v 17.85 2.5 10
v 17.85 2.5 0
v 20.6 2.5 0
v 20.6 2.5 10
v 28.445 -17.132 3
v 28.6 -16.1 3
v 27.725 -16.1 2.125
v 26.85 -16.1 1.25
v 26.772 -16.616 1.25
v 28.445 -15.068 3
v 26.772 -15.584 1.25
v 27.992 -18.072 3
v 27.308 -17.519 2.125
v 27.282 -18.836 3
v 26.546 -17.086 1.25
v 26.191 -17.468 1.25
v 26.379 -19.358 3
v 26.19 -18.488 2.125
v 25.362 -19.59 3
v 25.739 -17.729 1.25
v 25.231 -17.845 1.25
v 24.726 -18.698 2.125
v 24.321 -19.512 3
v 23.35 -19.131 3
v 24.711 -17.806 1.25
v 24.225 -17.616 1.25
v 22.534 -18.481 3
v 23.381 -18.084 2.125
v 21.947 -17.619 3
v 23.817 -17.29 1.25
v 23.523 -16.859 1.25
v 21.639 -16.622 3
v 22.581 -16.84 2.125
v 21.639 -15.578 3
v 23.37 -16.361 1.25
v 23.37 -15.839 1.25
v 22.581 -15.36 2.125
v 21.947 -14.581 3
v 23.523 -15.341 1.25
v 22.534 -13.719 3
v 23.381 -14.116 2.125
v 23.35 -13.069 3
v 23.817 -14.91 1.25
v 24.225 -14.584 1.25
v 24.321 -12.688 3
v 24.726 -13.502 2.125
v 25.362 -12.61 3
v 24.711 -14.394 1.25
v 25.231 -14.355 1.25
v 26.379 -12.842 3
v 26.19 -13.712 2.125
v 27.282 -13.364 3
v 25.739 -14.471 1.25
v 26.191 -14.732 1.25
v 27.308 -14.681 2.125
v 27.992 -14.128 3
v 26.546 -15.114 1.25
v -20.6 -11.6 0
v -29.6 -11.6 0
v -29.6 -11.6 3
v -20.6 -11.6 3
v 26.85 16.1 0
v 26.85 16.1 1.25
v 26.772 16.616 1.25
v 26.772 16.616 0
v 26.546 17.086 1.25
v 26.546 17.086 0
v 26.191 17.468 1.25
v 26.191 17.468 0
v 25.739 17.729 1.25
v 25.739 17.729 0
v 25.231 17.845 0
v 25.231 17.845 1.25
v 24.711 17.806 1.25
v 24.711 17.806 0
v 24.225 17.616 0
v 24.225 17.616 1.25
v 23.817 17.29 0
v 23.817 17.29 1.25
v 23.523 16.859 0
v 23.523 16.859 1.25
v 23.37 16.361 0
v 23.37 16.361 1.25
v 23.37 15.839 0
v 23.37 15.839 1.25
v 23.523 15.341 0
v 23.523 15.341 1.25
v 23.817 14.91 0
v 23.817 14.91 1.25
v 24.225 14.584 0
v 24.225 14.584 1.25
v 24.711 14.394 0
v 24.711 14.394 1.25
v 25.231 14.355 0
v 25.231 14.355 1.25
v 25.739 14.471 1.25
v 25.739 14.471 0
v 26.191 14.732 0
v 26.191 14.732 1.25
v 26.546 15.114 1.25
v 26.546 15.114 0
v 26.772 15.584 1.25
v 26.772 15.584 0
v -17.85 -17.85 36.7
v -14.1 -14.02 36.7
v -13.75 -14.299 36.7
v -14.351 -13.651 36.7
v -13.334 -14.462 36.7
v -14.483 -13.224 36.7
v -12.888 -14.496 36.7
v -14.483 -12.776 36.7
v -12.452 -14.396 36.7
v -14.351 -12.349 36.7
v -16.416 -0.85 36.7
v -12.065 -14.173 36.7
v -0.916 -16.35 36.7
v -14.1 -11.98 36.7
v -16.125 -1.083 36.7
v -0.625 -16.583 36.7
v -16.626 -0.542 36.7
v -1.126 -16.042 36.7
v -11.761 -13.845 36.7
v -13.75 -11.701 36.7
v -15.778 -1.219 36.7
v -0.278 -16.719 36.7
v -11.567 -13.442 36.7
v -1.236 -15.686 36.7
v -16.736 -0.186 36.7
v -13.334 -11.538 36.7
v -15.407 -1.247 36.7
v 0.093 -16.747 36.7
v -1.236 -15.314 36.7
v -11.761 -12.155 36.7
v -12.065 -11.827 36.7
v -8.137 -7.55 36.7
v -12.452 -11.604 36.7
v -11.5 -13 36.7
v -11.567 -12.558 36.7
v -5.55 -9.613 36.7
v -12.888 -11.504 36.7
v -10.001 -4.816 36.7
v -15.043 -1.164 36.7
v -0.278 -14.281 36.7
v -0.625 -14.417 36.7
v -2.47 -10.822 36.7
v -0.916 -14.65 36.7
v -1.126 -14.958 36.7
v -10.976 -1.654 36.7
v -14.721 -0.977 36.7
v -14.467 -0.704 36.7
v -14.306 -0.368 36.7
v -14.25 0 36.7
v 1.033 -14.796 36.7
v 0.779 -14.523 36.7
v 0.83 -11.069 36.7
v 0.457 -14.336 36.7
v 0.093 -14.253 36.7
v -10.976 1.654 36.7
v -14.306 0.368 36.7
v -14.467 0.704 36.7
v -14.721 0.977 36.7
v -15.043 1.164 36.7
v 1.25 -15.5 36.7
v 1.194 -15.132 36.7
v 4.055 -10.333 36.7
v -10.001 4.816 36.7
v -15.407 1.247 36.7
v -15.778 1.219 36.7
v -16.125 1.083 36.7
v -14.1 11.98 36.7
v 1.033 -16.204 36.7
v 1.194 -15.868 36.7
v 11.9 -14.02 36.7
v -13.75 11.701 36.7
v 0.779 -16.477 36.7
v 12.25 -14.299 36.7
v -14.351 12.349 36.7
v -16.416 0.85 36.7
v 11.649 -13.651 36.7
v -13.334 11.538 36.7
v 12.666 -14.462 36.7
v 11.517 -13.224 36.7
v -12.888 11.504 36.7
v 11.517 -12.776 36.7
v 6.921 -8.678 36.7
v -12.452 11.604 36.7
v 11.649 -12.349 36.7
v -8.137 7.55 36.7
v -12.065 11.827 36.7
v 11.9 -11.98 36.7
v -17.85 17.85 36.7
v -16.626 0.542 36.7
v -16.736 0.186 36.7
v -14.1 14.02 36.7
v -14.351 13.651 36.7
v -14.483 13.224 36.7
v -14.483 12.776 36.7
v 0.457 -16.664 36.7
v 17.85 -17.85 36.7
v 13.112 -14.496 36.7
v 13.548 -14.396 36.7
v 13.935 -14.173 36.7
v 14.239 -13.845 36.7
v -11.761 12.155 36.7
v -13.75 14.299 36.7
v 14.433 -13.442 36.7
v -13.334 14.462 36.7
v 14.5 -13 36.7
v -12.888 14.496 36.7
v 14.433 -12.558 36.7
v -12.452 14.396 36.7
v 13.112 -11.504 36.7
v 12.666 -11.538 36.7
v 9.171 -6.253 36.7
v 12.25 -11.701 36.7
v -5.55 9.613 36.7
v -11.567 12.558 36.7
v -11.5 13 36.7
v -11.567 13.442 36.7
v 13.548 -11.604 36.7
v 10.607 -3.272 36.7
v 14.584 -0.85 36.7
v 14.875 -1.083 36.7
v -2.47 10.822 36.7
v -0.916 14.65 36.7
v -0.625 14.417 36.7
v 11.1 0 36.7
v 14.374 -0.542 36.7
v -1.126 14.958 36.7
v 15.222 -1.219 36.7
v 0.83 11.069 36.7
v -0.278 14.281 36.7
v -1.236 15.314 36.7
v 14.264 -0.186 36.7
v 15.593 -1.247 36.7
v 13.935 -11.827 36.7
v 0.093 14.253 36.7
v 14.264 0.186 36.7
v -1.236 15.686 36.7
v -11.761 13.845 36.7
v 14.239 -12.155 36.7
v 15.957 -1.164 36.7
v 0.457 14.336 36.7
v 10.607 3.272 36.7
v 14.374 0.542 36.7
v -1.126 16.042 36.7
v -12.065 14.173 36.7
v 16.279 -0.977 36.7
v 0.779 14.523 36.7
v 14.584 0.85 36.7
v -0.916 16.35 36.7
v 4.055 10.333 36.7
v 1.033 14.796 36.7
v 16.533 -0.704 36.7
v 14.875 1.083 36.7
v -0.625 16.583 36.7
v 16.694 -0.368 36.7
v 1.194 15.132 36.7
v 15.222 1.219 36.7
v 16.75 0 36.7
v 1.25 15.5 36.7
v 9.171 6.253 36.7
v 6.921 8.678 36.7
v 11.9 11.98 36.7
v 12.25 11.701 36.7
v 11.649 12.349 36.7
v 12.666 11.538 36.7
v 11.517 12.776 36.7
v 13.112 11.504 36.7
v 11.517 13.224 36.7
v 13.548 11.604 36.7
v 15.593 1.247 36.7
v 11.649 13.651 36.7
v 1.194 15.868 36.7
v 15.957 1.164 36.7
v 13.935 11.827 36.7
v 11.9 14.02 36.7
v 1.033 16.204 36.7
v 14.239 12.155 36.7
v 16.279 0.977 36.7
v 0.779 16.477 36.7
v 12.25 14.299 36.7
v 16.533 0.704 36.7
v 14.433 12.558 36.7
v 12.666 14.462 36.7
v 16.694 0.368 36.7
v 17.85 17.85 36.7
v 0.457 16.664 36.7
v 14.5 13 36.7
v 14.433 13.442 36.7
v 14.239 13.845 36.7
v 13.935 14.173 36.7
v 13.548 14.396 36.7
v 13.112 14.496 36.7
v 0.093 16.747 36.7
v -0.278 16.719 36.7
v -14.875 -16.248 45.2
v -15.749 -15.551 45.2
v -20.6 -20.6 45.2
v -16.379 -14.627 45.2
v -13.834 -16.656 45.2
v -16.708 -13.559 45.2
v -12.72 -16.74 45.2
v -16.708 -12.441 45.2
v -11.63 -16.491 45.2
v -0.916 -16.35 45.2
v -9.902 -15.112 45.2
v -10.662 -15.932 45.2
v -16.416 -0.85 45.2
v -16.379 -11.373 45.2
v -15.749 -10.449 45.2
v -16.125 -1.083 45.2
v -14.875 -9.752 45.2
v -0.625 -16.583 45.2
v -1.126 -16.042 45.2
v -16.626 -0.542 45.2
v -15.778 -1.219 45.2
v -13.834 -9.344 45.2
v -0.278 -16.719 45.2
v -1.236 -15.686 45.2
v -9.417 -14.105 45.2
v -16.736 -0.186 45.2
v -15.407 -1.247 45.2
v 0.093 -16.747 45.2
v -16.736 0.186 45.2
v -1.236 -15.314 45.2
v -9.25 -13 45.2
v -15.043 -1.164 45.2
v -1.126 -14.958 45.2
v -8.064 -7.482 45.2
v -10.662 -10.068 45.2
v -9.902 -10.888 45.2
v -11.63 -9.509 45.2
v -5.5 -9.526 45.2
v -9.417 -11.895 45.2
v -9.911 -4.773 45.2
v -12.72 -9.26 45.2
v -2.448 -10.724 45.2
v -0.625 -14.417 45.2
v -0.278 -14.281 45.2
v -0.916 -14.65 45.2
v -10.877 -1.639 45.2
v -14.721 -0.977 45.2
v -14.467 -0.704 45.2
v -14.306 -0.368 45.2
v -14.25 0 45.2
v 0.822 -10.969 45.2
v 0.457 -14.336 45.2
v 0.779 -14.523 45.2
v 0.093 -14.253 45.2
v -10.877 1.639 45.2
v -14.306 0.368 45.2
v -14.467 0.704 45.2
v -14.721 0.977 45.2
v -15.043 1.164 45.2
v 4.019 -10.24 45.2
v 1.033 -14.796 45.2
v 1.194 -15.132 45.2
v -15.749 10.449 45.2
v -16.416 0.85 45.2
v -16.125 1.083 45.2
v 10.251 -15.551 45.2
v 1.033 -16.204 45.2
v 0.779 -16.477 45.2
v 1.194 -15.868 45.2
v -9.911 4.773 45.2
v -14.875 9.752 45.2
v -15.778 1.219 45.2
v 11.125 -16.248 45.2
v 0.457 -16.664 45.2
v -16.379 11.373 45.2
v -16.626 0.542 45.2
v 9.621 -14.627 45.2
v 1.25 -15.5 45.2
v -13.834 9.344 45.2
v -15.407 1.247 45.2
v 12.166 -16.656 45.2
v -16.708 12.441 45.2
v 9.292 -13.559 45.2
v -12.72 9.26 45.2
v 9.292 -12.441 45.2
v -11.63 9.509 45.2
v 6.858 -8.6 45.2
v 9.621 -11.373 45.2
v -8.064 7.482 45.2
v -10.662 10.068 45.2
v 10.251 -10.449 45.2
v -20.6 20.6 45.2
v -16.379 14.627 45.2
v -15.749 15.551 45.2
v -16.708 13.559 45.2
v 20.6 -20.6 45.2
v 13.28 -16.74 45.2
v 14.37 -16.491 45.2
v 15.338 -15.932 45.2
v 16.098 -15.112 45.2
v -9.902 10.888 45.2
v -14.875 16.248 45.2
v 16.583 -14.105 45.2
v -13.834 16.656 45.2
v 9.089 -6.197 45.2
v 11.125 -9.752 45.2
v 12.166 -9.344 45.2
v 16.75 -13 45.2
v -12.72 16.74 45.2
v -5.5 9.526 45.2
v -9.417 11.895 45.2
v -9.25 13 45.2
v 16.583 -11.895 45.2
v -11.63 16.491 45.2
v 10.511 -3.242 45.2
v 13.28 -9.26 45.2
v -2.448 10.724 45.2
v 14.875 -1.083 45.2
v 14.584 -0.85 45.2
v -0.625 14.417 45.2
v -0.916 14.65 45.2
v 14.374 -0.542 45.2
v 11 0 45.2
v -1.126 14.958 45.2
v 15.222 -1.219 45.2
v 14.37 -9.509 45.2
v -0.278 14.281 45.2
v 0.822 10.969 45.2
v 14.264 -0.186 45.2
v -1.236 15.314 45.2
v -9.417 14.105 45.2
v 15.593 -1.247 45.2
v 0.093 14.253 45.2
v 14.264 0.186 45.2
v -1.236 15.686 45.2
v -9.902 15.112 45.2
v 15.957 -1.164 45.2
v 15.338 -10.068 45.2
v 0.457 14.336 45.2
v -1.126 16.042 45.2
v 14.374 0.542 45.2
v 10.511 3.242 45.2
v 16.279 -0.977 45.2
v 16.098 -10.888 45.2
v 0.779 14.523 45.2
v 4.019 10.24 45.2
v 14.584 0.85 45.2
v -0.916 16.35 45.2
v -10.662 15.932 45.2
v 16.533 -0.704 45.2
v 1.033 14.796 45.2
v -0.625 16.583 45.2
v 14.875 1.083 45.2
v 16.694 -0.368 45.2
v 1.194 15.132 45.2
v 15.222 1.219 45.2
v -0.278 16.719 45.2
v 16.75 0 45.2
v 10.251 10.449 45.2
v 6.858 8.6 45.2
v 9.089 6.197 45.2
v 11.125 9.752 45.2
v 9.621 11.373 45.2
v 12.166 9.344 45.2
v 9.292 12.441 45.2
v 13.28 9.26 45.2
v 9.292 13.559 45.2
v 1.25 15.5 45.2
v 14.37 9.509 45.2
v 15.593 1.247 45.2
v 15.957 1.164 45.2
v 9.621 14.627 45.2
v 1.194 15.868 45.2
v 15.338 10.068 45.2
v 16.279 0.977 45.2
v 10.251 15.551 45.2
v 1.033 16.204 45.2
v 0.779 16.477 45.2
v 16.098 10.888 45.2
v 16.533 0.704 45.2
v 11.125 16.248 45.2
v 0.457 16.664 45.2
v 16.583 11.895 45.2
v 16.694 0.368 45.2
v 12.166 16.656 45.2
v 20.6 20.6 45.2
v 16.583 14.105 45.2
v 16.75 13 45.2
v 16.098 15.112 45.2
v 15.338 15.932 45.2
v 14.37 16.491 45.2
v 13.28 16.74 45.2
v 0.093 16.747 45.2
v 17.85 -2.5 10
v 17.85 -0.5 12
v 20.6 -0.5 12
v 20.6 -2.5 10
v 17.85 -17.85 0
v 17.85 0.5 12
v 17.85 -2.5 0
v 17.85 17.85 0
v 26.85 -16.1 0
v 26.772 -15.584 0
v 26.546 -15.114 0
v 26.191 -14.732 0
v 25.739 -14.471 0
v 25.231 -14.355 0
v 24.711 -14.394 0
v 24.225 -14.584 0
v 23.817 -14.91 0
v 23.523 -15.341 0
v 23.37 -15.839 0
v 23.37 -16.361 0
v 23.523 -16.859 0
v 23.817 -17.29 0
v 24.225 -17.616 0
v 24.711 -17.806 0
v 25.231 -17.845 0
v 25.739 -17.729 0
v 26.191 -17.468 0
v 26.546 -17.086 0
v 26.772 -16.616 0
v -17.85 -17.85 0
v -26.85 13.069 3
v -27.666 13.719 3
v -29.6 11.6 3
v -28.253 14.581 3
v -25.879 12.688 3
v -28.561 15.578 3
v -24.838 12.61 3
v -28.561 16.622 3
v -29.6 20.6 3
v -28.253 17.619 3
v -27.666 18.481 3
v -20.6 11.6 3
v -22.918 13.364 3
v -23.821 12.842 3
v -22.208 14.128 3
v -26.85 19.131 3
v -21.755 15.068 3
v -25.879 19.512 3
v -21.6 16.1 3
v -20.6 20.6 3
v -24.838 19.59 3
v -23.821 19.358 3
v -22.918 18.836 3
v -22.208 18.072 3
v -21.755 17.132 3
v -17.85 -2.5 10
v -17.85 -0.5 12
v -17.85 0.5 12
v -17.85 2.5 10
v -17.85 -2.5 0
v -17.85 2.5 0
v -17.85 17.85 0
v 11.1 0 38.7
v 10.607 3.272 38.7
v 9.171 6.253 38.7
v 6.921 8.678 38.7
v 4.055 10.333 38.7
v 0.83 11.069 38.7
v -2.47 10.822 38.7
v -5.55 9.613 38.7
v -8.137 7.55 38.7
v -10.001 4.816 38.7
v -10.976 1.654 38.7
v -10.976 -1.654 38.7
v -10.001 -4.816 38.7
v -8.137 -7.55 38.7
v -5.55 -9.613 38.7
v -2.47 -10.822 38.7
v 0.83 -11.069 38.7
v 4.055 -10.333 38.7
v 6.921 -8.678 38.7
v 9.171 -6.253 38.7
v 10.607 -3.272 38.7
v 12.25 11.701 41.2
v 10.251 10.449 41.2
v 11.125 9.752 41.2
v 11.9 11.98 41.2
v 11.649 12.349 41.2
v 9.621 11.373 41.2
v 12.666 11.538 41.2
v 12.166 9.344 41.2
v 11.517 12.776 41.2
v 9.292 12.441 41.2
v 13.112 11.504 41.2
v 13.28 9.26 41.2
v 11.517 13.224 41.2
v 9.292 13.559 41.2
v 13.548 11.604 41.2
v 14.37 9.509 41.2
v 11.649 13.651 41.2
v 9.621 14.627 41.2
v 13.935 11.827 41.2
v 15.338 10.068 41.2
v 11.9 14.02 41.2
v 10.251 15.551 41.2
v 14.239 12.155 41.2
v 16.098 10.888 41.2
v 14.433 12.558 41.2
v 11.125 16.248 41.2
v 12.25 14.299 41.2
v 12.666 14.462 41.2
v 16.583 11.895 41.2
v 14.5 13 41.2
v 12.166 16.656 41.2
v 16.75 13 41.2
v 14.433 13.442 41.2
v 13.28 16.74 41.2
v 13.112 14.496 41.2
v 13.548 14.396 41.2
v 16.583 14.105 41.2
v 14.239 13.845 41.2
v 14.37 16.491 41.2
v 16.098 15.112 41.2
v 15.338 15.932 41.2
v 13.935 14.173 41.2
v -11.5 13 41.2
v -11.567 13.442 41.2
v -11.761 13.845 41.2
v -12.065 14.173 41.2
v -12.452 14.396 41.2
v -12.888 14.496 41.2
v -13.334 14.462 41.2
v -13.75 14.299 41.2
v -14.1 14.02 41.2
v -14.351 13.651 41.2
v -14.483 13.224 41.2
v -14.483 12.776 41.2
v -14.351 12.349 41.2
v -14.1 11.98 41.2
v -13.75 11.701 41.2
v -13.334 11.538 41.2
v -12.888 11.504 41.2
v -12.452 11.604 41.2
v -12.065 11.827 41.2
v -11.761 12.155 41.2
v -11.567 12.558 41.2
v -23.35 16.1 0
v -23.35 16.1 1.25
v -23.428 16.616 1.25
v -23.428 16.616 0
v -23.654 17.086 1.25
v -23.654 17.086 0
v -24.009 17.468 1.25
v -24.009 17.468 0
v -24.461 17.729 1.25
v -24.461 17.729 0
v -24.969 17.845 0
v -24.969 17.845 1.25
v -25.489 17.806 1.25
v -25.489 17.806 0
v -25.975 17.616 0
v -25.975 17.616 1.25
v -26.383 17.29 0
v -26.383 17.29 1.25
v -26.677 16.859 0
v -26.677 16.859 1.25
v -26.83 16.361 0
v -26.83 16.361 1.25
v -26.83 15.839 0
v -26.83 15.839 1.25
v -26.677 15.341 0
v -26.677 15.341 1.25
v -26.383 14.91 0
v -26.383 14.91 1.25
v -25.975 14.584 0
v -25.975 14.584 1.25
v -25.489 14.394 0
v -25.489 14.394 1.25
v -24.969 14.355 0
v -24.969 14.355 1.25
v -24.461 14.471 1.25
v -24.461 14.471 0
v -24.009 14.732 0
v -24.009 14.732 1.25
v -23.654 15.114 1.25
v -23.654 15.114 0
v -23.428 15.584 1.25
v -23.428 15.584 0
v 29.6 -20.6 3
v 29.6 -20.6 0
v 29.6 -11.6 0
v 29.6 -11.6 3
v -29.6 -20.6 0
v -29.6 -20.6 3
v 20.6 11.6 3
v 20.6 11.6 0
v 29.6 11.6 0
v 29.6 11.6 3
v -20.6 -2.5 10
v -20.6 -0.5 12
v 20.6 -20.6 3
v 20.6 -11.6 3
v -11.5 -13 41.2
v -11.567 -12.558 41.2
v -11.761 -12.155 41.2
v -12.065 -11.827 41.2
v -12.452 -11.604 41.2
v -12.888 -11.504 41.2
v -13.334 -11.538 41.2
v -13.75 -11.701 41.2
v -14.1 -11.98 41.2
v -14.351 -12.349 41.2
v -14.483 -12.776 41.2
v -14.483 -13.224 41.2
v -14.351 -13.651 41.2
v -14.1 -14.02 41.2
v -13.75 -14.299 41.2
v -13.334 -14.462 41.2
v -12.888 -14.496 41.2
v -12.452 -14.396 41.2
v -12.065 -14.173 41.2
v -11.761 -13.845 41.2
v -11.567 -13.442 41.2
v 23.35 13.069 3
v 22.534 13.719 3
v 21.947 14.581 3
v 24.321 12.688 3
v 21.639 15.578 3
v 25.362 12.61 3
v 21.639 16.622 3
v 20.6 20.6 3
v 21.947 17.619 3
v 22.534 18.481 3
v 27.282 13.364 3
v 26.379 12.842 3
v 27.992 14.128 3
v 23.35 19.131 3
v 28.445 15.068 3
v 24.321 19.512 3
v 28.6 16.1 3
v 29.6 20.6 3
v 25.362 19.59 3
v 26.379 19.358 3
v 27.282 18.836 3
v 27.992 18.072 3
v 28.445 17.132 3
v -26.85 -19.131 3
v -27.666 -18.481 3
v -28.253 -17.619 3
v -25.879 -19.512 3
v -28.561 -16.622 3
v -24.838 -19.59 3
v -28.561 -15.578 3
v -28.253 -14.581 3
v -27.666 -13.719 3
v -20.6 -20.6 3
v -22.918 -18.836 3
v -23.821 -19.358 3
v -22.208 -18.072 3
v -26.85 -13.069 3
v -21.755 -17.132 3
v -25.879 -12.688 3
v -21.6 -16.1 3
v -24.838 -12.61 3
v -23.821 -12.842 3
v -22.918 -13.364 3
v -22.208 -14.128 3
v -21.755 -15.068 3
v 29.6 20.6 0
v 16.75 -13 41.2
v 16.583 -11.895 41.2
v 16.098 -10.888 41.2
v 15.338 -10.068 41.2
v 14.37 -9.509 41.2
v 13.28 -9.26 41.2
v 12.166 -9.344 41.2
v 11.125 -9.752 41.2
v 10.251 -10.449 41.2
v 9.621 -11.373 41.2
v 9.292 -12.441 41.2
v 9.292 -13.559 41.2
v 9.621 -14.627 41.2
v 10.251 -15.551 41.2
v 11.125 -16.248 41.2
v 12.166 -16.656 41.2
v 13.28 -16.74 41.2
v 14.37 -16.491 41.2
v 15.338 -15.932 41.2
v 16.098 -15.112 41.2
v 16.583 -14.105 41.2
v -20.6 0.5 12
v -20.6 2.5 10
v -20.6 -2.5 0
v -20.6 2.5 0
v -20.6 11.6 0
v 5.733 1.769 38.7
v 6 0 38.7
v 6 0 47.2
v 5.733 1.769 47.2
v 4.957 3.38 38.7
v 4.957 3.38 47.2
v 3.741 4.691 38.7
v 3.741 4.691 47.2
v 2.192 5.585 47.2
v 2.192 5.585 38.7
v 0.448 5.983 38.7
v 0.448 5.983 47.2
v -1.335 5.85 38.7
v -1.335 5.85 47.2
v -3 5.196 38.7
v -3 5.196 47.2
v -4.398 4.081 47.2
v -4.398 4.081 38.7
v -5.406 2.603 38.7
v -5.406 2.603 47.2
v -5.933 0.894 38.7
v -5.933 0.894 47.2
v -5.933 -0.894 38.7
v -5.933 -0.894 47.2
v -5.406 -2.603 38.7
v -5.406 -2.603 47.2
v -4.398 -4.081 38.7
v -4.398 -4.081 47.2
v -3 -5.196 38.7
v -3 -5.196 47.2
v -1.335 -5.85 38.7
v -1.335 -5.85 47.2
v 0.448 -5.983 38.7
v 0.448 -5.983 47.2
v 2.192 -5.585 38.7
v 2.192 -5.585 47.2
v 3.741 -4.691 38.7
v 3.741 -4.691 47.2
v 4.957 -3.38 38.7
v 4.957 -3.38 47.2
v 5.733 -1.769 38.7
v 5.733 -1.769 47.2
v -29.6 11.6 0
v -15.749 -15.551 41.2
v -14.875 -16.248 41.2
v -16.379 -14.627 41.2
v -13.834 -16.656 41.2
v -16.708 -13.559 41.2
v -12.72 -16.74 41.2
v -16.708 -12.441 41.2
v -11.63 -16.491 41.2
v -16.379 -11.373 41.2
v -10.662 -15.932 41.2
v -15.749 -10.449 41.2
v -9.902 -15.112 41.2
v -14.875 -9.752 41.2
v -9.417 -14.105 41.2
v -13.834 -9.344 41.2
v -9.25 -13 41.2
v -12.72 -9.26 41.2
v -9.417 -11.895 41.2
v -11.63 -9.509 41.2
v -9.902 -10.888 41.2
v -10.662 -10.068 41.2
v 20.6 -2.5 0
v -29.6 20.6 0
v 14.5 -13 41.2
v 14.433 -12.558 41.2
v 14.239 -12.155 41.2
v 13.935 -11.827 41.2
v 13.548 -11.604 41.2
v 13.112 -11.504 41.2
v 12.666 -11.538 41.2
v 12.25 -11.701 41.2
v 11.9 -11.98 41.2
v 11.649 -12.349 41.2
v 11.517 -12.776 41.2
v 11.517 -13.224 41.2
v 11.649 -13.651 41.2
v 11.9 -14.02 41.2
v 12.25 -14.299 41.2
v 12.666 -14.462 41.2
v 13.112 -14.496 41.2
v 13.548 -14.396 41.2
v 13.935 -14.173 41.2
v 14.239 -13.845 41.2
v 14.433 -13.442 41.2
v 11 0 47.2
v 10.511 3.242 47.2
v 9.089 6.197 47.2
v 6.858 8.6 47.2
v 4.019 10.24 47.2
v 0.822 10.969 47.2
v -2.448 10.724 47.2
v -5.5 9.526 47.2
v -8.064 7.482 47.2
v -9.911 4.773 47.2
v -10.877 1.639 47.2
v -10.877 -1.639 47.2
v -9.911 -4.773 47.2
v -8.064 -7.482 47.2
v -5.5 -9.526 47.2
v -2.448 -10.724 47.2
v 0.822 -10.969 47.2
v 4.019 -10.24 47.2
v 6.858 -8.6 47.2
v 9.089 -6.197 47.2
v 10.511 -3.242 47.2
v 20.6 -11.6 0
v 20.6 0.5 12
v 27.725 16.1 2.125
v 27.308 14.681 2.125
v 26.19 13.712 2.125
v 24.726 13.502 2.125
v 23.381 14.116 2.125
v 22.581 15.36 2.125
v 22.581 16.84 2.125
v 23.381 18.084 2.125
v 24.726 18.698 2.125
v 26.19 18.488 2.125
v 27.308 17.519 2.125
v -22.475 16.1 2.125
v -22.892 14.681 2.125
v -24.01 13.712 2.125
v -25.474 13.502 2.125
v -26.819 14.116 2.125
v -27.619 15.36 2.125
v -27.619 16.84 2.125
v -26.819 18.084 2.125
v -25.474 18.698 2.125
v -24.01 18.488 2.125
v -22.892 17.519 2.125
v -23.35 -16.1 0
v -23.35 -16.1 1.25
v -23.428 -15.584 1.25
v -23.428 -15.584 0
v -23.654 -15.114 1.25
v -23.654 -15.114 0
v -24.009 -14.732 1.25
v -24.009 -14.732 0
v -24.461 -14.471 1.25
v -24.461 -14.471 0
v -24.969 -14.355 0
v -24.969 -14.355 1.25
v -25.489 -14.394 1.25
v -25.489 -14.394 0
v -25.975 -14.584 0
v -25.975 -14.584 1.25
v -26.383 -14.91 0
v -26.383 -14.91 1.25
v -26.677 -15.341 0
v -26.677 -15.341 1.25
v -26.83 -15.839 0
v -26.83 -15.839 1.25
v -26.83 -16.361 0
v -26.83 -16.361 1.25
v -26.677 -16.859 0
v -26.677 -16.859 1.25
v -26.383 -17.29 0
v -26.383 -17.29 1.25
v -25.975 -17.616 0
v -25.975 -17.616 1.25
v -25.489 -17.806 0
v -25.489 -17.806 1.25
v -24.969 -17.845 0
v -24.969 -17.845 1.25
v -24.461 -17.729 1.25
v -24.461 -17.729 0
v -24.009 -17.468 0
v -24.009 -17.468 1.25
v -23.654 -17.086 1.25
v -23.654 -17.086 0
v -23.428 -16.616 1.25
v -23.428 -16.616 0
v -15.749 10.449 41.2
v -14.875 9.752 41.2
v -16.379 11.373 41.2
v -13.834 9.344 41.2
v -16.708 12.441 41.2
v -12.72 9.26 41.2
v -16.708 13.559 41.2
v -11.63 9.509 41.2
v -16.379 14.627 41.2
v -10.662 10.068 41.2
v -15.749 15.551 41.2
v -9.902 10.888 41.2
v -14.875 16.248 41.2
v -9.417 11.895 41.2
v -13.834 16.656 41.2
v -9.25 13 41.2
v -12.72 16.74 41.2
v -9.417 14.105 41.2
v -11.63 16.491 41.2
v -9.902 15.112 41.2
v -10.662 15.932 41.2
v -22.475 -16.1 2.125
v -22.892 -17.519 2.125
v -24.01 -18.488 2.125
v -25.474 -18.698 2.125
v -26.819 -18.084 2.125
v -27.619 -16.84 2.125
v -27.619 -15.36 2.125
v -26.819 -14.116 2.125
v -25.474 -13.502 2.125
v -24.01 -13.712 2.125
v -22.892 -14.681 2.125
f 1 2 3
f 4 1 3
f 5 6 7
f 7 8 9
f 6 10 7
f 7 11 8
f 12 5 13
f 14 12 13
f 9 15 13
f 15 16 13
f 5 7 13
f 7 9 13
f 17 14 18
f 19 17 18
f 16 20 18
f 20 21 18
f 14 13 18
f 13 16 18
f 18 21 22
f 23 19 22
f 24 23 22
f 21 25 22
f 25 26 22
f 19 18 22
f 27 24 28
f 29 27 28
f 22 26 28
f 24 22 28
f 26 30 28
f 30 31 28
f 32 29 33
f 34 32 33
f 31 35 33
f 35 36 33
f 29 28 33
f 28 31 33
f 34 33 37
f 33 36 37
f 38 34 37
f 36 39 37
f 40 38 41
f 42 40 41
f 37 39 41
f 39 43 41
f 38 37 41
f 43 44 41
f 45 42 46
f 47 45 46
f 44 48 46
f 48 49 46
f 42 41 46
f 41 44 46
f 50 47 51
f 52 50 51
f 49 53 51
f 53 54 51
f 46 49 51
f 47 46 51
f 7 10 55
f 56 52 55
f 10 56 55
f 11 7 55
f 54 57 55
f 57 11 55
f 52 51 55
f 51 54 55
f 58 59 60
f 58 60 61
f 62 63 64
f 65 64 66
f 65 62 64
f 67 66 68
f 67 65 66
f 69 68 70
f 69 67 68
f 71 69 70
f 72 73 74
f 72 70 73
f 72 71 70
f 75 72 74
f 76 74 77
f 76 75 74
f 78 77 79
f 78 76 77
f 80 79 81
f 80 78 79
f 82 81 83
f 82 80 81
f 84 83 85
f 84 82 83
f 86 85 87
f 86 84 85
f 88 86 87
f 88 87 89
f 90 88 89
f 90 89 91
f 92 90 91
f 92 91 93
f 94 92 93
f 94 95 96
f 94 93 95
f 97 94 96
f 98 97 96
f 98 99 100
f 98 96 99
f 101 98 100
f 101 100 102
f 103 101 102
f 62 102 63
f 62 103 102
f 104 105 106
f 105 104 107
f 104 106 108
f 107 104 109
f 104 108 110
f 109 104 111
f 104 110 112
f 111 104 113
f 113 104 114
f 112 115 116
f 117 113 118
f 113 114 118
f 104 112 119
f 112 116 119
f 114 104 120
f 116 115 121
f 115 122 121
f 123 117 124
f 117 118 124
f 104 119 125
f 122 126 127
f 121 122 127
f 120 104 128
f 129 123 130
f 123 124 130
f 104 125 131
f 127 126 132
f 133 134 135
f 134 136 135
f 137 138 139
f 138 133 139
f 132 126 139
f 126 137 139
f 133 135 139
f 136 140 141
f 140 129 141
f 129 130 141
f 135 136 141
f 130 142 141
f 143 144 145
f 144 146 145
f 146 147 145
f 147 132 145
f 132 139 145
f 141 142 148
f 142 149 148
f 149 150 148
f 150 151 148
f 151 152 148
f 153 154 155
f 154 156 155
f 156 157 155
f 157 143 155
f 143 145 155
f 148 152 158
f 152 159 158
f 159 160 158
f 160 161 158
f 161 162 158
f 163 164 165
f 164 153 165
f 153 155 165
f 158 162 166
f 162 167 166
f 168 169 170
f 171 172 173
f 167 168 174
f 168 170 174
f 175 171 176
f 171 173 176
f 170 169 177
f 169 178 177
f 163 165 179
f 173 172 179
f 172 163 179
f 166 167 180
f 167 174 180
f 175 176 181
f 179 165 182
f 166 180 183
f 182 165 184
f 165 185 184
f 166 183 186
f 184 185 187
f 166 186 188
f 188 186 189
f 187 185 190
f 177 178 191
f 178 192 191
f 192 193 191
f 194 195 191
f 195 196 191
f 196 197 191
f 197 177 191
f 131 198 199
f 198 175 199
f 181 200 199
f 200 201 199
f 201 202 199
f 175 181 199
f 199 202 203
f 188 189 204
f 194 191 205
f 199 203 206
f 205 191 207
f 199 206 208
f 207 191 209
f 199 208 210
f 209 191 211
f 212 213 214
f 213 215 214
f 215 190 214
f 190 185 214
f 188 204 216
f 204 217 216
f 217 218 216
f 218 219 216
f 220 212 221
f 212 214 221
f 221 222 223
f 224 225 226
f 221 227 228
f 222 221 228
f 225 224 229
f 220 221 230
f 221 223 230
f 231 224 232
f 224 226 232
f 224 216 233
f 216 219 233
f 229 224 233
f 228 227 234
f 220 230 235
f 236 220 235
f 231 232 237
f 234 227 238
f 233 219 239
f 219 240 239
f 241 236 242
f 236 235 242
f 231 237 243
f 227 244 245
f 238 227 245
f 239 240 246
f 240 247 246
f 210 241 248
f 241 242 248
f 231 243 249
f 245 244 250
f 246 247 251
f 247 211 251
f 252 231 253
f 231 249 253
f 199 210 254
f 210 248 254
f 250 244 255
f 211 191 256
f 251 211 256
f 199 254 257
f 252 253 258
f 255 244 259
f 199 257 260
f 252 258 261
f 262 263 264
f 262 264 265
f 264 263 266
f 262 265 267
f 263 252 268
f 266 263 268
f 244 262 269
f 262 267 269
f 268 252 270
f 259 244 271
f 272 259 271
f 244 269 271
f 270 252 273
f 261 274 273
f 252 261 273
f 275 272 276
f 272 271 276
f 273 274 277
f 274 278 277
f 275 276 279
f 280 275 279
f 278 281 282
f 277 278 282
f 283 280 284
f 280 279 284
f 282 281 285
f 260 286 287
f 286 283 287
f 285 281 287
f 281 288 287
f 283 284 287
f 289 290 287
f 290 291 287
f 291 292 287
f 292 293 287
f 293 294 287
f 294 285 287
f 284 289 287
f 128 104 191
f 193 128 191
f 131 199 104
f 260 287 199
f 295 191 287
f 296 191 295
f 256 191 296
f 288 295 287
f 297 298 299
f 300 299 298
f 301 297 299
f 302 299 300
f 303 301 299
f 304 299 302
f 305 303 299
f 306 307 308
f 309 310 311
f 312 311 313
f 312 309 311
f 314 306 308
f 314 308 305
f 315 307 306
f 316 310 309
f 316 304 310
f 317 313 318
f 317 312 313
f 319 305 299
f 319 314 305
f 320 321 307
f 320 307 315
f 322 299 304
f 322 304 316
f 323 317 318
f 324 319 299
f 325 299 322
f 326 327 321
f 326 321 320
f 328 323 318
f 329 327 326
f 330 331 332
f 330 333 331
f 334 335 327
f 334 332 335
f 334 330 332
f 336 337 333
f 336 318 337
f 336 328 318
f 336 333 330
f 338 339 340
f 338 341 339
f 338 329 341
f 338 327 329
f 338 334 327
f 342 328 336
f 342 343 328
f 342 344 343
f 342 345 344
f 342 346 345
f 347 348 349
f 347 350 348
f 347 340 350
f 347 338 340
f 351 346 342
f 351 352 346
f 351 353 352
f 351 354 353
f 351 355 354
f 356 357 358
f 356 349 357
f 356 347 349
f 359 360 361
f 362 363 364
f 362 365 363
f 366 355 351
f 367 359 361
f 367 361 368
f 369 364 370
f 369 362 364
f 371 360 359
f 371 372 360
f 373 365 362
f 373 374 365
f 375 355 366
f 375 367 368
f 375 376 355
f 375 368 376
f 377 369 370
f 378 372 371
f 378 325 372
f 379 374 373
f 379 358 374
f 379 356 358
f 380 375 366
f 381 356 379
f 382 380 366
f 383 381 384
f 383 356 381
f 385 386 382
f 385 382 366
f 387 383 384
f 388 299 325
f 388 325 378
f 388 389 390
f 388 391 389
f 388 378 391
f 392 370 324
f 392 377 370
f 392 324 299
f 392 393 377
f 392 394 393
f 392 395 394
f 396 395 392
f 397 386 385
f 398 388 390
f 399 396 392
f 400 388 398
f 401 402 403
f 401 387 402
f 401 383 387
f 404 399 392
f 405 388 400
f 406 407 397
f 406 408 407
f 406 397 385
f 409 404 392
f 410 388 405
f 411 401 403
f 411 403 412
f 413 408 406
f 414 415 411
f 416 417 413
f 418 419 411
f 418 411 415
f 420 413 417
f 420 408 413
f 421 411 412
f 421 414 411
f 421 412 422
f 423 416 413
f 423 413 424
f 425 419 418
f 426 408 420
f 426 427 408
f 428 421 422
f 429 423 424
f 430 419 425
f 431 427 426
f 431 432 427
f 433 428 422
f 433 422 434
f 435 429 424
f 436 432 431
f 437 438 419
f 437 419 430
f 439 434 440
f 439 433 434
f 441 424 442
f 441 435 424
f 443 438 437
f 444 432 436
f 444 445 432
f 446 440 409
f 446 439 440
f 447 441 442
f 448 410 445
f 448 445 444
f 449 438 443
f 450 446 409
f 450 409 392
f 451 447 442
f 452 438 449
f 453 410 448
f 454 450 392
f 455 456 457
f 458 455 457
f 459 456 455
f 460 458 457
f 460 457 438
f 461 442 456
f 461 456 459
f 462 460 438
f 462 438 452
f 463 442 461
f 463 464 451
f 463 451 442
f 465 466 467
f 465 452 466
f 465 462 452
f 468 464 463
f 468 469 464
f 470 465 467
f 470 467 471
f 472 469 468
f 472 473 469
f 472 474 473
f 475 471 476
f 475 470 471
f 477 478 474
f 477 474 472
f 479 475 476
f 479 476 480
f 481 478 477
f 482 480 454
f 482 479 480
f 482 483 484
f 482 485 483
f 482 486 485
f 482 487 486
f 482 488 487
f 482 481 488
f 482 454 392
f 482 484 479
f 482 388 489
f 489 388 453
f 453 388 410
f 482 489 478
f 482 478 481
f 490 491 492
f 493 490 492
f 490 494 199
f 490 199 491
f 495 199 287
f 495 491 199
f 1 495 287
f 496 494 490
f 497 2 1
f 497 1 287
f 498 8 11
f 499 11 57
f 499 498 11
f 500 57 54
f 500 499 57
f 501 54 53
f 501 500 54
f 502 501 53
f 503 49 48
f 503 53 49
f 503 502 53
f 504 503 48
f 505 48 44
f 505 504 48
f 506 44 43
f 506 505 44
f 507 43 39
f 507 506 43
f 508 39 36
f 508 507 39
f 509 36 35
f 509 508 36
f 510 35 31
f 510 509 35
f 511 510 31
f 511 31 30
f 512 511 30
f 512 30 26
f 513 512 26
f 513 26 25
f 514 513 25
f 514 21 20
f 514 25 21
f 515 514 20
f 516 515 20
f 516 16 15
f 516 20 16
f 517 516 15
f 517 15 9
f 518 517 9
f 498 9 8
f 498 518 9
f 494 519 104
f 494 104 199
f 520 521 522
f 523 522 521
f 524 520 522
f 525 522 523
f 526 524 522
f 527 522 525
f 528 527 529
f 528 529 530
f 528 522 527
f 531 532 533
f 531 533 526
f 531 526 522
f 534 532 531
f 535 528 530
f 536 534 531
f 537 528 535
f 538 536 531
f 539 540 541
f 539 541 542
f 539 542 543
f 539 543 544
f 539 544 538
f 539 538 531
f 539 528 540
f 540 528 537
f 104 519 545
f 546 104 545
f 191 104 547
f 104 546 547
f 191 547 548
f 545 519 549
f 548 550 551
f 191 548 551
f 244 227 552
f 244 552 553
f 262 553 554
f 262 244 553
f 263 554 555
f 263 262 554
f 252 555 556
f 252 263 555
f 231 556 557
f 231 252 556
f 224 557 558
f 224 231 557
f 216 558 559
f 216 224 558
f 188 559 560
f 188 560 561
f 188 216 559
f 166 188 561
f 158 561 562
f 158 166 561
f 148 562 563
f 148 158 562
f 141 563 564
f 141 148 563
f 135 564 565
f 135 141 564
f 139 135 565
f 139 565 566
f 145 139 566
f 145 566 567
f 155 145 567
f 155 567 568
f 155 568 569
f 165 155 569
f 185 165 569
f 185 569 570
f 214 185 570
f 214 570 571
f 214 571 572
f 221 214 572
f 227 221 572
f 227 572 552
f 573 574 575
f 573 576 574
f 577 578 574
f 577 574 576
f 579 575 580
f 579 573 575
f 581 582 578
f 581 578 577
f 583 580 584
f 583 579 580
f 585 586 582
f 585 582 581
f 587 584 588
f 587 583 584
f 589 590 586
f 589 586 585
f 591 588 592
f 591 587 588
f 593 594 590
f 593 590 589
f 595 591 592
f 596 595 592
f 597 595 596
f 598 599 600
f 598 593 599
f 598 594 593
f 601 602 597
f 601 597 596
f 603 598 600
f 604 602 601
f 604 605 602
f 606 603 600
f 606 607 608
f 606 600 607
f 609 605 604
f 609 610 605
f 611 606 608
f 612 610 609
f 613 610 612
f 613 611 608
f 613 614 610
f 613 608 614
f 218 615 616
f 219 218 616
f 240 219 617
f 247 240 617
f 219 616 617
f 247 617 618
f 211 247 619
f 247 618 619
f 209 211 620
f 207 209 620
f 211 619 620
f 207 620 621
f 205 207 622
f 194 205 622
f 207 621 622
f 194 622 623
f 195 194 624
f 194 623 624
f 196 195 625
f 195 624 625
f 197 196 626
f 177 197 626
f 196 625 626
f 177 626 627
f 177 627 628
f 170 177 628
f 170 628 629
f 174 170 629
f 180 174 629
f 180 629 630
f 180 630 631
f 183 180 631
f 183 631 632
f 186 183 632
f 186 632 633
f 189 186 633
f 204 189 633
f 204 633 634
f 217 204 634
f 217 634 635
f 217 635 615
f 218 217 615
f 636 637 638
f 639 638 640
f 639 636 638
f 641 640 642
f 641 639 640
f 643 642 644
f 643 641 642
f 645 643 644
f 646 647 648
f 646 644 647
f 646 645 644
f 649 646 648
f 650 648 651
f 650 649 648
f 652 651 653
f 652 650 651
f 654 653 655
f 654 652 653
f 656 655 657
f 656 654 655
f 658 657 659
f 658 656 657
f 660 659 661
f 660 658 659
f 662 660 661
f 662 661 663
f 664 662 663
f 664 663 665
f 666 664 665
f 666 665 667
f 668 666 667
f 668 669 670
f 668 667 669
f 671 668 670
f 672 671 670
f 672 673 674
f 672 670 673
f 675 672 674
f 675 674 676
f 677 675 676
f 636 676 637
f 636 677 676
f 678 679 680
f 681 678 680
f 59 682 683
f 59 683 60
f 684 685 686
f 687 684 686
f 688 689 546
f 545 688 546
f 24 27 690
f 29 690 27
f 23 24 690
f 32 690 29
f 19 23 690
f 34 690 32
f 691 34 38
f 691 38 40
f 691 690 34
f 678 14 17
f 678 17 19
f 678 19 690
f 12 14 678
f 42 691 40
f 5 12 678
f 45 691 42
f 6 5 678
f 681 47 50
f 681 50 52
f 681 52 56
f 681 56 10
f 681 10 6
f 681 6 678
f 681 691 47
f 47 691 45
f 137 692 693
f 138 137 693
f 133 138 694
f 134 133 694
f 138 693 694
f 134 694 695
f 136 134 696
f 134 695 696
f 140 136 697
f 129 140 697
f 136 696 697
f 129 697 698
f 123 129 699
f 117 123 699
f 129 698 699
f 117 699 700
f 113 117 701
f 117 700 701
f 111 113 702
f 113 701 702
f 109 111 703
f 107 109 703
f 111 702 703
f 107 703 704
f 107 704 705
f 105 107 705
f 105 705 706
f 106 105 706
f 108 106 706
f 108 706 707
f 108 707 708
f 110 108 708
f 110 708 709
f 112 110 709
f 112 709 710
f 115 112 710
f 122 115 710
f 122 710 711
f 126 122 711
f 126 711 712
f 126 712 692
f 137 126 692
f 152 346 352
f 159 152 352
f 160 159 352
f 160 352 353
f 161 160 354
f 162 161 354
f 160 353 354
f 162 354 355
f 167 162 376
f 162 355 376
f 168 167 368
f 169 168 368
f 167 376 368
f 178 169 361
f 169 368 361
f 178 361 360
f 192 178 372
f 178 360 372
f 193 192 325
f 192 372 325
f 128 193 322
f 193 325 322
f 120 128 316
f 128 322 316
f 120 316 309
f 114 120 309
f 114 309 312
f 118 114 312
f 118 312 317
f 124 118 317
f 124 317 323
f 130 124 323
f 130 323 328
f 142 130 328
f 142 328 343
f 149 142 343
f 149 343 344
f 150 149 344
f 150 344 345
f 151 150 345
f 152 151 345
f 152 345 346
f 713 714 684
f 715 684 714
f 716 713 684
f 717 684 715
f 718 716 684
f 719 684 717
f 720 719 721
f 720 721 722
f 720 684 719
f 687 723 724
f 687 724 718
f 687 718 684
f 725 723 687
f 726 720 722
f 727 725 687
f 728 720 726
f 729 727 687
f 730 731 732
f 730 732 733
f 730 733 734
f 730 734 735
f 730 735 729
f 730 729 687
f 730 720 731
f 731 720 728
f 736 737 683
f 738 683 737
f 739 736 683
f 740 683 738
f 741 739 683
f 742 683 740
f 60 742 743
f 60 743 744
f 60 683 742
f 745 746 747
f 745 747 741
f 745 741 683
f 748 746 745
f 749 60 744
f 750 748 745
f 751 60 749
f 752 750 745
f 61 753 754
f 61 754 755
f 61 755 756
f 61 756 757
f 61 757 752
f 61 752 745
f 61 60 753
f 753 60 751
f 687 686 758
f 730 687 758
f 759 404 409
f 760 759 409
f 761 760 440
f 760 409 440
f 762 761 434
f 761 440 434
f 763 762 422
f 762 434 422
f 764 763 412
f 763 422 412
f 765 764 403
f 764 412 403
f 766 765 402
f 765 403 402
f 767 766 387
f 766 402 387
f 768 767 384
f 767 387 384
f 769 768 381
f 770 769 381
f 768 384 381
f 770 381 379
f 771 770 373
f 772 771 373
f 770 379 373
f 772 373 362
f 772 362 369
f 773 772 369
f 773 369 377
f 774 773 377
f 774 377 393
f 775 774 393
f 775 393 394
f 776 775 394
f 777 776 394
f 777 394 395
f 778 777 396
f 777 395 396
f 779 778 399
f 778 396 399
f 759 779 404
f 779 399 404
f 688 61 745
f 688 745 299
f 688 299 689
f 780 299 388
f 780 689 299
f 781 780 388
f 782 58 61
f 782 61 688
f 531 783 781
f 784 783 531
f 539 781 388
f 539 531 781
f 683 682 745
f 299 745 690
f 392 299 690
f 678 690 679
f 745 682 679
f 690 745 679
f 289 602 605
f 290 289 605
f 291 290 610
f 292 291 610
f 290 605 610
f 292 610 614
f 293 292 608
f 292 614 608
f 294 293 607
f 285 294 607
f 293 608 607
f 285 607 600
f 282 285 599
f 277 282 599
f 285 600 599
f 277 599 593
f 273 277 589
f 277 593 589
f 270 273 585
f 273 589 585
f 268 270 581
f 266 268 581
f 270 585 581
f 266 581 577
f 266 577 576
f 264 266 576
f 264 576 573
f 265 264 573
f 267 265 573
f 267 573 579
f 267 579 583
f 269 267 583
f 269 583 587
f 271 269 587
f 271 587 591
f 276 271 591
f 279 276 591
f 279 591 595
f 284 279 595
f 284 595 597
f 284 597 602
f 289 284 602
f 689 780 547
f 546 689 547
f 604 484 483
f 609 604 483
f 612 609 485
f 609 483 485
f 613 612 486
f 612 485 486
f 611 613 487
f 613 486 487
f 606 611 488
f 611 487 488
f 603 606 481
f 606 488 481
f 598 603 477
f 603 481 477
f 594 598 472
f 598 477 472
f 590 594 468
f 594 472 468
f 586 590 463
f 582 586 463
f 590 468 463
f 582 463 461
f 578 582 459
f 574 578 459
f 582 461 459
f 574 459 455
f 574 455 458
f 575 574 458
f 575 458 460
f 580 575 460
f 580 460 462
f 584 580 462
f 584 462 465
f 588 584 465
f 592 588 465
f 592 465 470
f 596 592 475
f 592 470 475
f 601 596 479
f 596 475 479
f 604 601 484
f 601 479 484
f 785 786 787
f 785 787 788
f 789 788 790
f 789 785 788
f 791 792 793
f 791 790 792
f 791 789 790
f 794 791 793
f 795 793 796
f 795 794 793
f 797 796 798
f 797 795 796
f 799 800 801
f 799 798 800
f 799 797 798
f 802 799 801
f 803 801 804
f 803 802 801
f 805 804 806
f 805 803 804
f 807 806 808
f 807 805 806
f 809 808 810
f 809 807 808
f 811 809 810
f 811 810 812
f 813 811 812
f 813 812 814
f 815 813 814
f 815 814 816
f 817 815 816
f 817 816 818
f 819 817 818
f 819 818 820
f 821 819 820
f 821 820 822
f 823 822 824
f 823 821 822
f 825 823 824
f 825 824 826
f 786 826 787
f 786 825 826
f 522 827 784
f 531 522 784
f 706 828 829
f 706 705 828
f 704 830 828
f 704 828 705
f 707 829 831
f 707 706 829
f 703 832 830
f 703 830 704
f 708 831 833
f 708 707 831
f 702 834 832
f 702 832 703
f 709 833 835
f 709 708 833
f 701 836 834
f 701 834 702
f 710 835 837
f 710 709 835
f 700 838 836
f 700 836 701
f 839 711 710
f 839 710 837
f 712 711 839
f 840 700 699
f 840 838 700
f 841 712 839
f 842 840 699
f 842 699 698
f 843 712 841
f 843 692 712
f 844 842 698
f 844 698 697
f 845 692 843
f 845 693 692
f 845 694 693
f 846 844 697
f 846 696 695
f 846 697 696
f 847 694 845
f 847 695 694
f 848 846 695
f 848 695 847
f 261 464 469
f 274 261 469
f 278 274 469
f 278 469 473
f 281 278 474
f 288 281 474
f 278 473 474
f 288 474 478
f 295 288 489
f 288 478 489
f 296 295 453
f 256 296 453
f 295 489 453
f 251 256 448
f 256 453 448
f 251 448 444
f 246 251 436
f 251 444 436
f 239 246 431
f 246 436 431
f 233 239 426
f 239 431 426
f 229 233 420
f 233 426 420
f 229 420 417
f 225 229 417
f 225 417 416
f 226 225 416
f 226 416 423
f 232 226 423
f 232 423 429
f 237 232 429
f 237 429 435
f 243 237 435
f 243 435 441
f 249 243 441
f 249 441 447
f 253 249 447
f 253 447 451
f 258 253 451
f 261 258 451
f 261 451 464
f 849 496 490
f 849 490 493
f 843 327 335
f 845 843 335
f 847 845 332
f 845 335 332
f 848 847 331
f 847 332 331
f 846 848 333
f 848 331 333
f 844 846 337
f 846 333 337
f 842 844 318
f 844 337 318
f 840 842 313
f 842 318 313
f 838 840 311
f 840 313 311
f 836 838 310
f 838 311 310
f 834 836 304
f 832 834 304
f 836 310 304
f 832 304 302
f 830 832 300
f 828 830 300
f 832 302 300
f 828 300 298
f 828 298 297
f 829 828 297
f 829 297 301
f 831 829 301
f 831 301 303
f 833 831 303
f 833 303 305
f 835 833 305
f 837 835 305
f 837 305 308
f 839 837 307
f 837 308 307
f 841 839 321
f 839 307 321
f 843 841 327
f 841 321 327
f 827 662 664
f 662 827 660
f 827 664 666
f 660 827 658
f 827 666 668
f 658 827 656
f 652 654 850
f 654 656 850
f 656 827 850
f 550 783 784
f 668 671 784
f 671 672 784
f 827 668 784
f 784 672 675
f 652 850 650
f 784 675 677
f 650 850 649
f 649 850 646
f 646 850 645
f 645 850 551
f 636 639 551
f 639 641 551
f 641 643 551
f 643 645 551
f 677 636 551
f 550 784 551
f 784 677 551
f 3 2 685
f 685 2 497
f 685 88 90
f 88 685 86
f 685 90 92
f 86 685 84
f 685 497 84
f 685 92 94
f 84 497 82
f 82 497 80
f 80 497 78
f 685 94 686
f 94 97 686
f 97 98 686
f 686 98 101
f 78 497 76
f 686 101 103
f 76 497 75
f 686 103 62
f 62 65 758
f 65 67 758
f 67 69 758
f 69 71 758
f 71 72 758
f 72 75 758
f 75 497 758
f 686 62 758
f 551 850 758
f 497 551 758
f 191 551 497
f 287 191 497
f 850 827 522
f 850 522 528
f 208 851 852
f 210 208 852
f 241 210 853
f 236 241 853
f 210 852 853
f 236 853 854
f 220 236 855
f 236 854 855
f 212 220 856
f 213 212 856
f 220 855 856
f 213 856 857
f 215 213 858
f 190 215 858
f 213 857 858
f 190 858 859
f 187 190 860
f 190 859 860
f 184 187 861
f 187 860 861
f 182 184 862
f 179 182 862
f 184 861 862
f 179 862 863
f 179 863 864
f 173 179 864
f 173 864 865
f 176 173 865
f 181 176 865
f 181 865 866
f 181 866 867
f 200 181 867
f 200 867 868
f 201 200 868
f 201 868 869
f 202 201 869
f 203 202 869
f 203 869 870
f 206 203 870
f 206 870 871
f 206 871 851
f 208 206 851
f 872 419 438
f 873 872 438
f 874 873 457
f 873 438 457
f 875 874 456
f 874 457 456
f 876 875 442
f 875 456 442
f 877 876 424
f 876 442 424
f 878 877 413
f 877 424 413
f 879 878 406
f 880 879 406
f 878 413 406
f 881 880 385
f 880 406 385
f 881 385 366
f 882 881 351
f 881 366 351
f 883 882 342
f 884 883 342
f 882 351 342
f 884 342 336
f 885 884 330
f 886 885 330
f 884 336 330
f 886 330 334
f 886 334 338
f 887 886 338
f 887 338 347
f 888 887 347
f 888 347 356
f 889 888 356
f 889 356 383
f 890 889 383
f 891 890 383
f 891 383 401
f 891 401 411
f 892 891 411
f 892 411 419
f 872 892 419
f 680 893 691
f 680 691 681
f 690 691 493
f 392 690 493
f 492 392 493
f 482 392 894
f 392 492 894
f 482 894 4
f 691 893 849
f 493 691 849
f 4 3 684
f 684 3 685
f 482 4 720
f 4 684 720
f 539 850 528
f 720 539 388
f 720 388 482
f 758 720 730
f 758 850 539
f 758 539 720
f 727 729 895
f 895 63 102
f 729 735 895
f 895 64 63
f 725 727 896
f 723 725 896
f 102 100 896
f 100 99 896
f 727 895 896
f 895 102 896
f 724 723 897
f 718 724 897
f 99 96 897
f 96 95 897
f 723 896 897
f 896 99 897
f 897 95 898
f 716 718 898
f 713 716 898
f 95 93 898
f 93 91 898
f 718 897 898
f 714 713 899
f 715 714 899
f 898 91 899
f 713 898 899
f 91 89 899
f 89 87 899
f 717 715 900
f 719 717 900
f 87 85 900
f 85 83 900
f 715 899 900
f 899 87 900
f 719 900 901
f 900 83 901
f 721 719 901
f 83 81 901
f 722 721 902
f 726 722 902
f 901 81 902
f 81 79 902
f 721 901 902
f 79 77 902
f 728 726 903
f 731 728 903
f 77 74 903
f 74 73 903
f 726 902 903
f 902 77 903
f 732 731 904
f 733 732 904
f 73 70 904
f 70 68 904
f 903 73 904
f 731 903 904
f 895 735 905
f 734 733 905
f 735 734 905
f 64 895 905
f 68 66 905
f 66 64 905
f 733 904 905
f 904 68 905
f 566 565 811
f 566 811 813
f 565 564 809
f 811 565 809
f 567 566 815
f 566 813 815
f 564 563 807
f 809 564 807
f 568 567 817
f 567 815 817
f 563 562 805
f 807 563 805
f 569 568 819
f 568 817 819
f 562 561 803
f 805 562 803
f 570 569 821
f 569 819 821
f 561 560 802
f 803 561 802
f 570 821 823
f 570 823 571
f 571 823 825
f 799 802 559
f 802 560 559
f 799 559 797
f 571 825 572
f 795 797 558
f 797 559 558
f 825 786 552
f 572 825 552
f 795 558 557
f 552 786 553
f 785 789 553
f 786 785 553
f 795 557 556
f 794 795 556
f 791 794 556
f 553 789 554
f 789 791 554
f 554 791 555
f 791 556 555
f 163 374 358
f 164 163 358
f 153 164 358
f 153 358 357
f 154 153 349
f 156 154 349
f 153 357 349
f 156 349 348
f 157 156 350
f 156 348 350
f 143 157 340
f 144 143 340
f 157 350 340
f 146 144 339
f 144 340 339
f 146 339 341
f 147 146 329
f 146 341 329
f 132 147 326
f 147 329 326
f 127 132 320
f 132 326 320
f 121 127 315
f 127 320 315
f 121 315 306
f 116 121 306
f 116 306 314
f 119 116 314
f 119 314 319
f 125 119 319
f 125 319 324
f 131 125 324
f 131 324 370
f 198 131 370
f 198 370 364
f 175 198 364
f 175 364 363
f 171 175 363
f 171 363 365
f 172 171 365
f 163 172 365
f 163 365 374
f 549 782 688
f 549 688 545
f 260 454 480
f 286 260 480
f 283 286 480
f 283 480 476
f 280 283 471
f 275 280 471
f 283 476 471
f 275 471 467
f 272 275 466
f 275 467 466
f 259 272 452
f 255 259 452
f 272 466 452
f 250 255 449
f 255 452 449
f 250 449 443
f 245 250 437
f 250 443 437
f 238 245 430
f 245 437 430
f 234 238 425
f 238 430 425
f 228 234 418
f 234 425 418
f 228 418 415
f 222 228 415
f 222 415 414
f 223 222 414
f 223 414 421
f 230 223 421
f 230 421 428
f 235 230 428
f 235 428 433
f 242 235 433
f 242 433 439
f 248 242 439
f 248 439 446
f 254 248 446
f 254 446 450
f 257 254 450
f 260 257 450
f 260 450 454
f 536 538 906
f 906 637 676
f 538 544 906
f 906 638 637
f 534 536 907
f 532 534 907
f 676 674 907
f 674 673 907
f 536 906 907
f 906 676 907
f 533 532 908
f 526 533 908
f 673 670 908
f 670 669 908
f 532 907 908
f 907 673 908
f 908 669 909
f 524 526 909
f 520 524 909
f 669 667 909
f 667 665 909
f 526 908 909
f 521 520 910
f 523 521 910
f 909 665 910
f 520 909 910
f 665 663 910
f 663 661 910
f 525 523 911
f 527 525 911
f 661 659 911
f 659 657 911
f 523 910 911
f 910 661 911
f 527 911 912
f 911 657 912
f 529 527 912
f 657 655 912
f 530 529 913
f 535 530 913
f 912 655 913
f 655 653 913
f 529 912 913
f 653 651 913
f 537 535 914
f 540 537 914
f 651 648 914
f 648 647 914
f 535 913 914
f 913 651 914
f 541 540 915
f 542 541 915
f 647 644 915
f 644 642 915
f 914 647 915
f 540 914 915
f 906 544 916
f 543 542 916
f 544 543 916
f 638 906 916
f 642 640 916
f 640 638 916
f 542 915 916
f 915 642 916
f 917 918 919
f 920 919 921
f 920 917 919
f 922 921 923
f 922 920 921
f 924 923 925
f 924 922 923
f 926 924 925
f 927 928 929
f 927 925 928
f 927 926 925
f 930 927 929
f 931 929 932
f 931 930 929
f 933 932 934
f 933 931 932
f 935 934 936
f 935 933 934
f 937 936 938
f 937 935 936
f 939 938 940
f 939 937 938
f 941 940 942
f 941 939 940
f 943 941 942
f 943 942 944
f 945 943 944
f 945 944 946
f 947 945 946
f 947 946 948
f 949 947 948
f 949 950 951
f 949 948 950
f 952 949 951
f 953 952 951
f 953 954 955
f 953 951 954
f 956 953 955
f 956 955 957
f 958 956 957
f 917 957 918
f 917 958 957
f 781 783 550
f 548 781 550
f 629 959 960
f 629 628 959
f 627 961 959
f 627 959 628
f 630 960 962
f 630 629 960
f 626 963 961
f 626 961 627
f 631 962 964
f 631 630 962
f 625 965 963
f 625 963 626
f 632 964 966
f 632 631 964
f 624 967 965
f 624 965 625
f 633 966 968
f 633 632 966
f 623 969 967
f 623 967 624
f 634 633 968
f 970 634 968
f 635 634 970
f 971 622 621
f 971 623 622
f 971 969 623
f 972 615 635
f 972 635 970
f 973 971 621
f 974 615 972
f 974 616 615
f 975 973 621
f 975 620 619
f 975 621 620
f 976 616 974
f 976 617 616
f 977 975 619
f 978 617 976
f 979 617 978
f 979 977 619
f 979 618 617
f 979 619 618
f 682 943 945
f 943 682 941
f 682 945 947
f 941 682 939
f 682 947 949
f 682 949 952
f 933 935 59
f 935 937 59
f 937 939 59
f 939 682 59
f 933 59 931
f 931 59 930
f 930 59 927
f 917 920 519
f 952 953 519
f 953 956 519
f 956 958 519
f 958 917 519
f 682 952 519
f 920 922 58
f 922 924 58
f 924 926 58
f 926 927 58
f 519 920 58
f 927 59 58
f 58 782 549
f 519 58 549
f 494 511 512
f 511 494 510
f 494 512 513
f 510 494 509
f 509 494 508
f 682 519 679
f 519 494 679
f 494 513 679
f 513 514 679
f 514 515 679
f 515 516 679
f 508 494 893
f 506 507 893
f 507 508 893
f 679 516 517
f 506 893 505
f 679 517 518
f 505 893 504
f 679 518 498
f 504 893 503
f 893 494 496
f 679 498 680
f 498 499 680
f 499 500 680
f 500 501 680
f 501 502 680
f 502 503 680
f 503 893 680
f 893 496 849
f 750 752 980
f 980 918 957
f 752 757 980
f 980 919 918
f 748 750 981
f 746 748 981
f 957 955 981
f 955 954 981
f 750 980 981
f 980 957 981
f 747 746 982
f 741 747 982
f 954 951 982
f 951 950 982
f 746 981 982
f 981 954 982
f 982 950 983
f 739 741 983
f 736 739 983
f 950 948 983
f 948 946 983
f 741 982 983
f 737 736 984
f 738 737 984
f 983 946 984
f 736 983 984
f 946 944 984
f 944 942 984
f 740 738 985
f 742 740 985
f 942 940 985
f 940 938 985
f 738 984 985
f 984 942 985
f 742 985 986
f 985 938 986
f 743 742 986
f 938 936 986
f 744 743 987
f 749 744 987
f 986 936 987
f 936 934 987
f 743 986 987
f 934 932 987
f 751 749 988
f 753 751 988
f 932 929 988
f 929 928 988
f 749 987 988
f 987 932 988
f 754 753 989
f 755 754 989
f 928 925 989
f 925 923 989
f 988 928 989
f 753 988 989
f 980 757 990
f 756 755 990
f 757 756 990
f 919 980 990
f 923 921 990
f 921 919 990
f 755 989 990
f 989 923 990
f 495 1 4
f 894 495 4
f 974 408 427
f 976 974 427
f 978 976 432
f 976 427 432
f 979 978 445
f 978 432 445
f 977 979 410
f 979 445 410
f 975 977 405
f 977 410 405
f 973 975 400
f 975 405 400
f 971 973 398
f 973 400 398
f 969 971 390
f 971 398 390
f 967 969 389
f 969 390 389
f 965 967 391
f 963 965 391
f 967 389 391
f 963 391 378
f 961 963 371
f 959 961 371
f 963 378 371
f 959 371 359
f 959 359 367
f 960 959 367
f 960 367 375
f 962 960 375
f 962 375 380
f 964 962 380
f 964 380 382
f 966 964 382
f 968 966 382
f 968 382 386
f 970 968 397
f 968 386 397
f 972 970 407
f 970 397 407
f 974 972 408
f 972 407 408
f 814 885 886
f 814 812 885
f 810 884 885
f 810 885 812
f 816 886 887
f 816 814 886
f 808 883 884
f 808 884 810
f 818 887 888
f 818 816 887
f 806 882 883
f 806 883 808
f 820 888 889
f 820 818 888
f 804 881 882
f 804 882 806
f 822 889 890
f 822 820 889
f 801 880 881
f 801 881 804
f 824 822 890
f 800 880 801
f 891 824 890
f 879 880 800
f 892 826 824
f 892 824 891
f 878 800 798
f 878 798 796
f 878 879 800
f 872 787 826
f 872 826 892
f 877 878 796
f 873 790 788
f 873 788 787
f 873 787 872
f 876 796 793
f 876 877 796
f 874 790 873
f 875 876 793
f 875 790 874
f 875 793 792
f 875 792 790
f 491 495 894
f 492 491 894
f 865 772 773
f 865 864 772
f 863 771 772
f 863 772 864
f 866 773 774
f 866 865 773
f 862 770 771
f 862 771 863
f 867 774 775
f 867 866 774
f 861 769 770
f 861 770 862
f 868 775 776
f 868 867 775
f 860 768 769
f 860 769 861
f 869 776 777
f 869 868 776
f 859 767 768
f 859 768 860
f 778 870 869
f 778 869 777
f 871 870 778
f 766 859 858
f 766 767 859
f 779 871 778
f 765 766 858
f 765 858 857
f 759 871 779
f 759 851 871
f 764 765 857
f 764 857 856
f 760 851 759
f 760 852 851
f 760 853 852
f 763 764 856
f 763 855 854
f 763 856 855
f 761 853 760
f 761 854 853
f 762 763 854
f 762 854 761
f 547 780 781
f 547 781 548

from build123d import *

# Parameters (mm, degrees)
SKETCH_W        = 41.2
SKETCH_H        = 41.2
PAD_DEPTH       = 45.2
SKETCH001_R     = 11
PAD001_DEPTH    = 47.2
SKETCH002_R     = 11.1
POCKET_DEPTH    = 38.7
SKETCH003_W     = 35.7
SKETCH003_H     = 35.7
POCKET001_DEPTH = 36.7
SKETCH004_R     = 1.5
SKETCH004_R_2   = 1.25
POCKET002_DEPTH = 45.201
SKETCH005_R     = 3.75
POCKET003_DEPTH = 4
SKETCH006_R     = 6
POCKET004_DEPTH = 47.201
SKETCH007_W     = 55
SKETCH007_H     = 5
POCKET005_DEPTH = 12
CHAMFER_SIZE    = 2
SKETCH008_W     = 9
SKETCH008_H     = 9
PAD002_DEPTH    = 3
SKETCH009_R     = 1.75
POCKET006_DEPTH = 47.201
CHAMFER001_SIZE = 1.75


with BuildPart() as part:
    # Sketch → Pad (new body)
    with BuildSketch(Plane.XY):
        Rectangle(SKETCH_W, SKETCH_H)
    extrude(amount=PAD_DEPTH)

    # Sketch001 → Pad001 (join)
    with BuildSketch(Plane.XY):
        Circle(SKETCH001_R)
    extrude(amount=PAD001_DEPTH)

    # Sketch002 → Pocket (cut)
    with BuildSketch(Plane.XY):
        Circle(SKETCH002_R)
    extrude(amount=POCKET_DEPTH, mode=Mode.SUBTRACT)

    # Sketch003 → Pocket001 (cut)
    with BuildSketch(Plane.XY):
        Rectangle(SKETCH003_W, SKETCH003_H)
    extrude(amount=POCKET001_DEPTH, mode=Mode.SUBTRACT)

    # Sketch004 (on DatumPlane) → Pocket002 (cut, through all)
    with BuildSketch(Plane.XY.offset(45.2)):
        with Locations((13, 13)):
            Circle(SKETCH004_R)
        with Locations((15.5, 0)):
            Circle(SKETCH004_R_2)
        with Locations((-13, 13)):
            Circle(SKETCH004_R)
        with Locations((0, 15.5)):
            Circle(SKETCH004_R_2)
        with Locations((-15.5, 0)):
            Circle(SKETCH004_R_2)
        with Locations((0, -15.5)):
            Circle(SKETCH004_R_2)
        with Locations((13, -13)):
            Circle(SKETCH004_R)
        with Locations((-13, -13)):
            Circle(SKETCH004_R)
    extrude(amount=-POCKET002_DEPTH, mode=Mode.SUBTRACT)

    # Sketch005 (on DatumPlane) → Pocket003 (cut)
    with BuildSketch(Plane.XY.offset(45.2)):
        with Locations((-13, 13)):
            Circle(SKETCH005_R)
        with Locations((13, 13)):
            Circle(SKETCH005_R)
        with Locations((13, -13)):
            Circle(SKETCH005_R)
        with Locations((-13, -13)):
            Circle(SKETCH005_R)
    extrude(amount=-POCKET003_DEPTH, mode=Mode.SUBTRACT)

    # Sketch006 → Pocket004 (cut, through all)
    with BuildSketch(Plane.XY):
        Circle(SKETCH006_R)
    extrude(amount=POCKET004_DEPTH, mode=Mode.SUBTRACT)

    # Sketch007 → Pocket005 (cut)
    with BuildSketch(Plane.XY):
        Rectangle(SKETCH007_W, SKETCH007_H)
    extrude(amount=POCKET005_DEPTH, mode=Mode.SUBTRACT)

    # Chamfer
    chamfer_edges = [part.edges().sort_by_distance(p)[0] for p in [
        (19.225, 2.5, 12),
        (19.225, -2.5, 12),
        (-19.225, -2.5, 12),
        (-19.225, 2.5, 12),
    ]]
    chamfer(chamfer_edges, length=CHAMFER_SIZE)

    # Sketch008 → Pad002 (join)
    with BuildSketch(Plane.XY):
        with Locations((-25.1, 16.1)):
            Rectangle(SKETCH008_W, SKETCH008_H)
        with Locations((25.1, 16.1)):
            Rectangle(SKETCH008_W, SKETCH008_H)
        with Locations((25.1, -16.1)):
            Rectangle(SKETCH008_W, SKETCH008_H)
        with Locations((-25.1, -16.1)):
            Rectangle(SKETCH008_W, SKETCH008_H)
    extrude(amount=PAD002_DEPTH)

    # Sketch009 → Pocket006 (cut, through all)
    with BuildSketch(Plane.XY):
        with Locations((-25.1, 16.1)):
            Circle(SKETCH009_R)
        with Locations((-25.1, -16.1)):
            Circle(SKETCH009_R)
        with Locations((25.1, -16.1)):
            Circle(SKETCH009_R)
        with Locations((25.1, 16.1)):
            Circle(SKETCH009_R)
    extrude(amount=POCKET006_DEPTH, mode=Mode.SUBTRACT)

    # Chamfer001
    chamfer001_edges = [part.edges().sort_by_distance(p)[0] for p in [
        (-26.85, 16.1, 3),
        (-26.85, -16.1, 3),
        (23.35, 16.1, 3),
        (23.35, -16.1, 3),
    ]]
    chamfer(chamfer001_edges, length=CHAMFER001_SIZE)


solid = part.part
